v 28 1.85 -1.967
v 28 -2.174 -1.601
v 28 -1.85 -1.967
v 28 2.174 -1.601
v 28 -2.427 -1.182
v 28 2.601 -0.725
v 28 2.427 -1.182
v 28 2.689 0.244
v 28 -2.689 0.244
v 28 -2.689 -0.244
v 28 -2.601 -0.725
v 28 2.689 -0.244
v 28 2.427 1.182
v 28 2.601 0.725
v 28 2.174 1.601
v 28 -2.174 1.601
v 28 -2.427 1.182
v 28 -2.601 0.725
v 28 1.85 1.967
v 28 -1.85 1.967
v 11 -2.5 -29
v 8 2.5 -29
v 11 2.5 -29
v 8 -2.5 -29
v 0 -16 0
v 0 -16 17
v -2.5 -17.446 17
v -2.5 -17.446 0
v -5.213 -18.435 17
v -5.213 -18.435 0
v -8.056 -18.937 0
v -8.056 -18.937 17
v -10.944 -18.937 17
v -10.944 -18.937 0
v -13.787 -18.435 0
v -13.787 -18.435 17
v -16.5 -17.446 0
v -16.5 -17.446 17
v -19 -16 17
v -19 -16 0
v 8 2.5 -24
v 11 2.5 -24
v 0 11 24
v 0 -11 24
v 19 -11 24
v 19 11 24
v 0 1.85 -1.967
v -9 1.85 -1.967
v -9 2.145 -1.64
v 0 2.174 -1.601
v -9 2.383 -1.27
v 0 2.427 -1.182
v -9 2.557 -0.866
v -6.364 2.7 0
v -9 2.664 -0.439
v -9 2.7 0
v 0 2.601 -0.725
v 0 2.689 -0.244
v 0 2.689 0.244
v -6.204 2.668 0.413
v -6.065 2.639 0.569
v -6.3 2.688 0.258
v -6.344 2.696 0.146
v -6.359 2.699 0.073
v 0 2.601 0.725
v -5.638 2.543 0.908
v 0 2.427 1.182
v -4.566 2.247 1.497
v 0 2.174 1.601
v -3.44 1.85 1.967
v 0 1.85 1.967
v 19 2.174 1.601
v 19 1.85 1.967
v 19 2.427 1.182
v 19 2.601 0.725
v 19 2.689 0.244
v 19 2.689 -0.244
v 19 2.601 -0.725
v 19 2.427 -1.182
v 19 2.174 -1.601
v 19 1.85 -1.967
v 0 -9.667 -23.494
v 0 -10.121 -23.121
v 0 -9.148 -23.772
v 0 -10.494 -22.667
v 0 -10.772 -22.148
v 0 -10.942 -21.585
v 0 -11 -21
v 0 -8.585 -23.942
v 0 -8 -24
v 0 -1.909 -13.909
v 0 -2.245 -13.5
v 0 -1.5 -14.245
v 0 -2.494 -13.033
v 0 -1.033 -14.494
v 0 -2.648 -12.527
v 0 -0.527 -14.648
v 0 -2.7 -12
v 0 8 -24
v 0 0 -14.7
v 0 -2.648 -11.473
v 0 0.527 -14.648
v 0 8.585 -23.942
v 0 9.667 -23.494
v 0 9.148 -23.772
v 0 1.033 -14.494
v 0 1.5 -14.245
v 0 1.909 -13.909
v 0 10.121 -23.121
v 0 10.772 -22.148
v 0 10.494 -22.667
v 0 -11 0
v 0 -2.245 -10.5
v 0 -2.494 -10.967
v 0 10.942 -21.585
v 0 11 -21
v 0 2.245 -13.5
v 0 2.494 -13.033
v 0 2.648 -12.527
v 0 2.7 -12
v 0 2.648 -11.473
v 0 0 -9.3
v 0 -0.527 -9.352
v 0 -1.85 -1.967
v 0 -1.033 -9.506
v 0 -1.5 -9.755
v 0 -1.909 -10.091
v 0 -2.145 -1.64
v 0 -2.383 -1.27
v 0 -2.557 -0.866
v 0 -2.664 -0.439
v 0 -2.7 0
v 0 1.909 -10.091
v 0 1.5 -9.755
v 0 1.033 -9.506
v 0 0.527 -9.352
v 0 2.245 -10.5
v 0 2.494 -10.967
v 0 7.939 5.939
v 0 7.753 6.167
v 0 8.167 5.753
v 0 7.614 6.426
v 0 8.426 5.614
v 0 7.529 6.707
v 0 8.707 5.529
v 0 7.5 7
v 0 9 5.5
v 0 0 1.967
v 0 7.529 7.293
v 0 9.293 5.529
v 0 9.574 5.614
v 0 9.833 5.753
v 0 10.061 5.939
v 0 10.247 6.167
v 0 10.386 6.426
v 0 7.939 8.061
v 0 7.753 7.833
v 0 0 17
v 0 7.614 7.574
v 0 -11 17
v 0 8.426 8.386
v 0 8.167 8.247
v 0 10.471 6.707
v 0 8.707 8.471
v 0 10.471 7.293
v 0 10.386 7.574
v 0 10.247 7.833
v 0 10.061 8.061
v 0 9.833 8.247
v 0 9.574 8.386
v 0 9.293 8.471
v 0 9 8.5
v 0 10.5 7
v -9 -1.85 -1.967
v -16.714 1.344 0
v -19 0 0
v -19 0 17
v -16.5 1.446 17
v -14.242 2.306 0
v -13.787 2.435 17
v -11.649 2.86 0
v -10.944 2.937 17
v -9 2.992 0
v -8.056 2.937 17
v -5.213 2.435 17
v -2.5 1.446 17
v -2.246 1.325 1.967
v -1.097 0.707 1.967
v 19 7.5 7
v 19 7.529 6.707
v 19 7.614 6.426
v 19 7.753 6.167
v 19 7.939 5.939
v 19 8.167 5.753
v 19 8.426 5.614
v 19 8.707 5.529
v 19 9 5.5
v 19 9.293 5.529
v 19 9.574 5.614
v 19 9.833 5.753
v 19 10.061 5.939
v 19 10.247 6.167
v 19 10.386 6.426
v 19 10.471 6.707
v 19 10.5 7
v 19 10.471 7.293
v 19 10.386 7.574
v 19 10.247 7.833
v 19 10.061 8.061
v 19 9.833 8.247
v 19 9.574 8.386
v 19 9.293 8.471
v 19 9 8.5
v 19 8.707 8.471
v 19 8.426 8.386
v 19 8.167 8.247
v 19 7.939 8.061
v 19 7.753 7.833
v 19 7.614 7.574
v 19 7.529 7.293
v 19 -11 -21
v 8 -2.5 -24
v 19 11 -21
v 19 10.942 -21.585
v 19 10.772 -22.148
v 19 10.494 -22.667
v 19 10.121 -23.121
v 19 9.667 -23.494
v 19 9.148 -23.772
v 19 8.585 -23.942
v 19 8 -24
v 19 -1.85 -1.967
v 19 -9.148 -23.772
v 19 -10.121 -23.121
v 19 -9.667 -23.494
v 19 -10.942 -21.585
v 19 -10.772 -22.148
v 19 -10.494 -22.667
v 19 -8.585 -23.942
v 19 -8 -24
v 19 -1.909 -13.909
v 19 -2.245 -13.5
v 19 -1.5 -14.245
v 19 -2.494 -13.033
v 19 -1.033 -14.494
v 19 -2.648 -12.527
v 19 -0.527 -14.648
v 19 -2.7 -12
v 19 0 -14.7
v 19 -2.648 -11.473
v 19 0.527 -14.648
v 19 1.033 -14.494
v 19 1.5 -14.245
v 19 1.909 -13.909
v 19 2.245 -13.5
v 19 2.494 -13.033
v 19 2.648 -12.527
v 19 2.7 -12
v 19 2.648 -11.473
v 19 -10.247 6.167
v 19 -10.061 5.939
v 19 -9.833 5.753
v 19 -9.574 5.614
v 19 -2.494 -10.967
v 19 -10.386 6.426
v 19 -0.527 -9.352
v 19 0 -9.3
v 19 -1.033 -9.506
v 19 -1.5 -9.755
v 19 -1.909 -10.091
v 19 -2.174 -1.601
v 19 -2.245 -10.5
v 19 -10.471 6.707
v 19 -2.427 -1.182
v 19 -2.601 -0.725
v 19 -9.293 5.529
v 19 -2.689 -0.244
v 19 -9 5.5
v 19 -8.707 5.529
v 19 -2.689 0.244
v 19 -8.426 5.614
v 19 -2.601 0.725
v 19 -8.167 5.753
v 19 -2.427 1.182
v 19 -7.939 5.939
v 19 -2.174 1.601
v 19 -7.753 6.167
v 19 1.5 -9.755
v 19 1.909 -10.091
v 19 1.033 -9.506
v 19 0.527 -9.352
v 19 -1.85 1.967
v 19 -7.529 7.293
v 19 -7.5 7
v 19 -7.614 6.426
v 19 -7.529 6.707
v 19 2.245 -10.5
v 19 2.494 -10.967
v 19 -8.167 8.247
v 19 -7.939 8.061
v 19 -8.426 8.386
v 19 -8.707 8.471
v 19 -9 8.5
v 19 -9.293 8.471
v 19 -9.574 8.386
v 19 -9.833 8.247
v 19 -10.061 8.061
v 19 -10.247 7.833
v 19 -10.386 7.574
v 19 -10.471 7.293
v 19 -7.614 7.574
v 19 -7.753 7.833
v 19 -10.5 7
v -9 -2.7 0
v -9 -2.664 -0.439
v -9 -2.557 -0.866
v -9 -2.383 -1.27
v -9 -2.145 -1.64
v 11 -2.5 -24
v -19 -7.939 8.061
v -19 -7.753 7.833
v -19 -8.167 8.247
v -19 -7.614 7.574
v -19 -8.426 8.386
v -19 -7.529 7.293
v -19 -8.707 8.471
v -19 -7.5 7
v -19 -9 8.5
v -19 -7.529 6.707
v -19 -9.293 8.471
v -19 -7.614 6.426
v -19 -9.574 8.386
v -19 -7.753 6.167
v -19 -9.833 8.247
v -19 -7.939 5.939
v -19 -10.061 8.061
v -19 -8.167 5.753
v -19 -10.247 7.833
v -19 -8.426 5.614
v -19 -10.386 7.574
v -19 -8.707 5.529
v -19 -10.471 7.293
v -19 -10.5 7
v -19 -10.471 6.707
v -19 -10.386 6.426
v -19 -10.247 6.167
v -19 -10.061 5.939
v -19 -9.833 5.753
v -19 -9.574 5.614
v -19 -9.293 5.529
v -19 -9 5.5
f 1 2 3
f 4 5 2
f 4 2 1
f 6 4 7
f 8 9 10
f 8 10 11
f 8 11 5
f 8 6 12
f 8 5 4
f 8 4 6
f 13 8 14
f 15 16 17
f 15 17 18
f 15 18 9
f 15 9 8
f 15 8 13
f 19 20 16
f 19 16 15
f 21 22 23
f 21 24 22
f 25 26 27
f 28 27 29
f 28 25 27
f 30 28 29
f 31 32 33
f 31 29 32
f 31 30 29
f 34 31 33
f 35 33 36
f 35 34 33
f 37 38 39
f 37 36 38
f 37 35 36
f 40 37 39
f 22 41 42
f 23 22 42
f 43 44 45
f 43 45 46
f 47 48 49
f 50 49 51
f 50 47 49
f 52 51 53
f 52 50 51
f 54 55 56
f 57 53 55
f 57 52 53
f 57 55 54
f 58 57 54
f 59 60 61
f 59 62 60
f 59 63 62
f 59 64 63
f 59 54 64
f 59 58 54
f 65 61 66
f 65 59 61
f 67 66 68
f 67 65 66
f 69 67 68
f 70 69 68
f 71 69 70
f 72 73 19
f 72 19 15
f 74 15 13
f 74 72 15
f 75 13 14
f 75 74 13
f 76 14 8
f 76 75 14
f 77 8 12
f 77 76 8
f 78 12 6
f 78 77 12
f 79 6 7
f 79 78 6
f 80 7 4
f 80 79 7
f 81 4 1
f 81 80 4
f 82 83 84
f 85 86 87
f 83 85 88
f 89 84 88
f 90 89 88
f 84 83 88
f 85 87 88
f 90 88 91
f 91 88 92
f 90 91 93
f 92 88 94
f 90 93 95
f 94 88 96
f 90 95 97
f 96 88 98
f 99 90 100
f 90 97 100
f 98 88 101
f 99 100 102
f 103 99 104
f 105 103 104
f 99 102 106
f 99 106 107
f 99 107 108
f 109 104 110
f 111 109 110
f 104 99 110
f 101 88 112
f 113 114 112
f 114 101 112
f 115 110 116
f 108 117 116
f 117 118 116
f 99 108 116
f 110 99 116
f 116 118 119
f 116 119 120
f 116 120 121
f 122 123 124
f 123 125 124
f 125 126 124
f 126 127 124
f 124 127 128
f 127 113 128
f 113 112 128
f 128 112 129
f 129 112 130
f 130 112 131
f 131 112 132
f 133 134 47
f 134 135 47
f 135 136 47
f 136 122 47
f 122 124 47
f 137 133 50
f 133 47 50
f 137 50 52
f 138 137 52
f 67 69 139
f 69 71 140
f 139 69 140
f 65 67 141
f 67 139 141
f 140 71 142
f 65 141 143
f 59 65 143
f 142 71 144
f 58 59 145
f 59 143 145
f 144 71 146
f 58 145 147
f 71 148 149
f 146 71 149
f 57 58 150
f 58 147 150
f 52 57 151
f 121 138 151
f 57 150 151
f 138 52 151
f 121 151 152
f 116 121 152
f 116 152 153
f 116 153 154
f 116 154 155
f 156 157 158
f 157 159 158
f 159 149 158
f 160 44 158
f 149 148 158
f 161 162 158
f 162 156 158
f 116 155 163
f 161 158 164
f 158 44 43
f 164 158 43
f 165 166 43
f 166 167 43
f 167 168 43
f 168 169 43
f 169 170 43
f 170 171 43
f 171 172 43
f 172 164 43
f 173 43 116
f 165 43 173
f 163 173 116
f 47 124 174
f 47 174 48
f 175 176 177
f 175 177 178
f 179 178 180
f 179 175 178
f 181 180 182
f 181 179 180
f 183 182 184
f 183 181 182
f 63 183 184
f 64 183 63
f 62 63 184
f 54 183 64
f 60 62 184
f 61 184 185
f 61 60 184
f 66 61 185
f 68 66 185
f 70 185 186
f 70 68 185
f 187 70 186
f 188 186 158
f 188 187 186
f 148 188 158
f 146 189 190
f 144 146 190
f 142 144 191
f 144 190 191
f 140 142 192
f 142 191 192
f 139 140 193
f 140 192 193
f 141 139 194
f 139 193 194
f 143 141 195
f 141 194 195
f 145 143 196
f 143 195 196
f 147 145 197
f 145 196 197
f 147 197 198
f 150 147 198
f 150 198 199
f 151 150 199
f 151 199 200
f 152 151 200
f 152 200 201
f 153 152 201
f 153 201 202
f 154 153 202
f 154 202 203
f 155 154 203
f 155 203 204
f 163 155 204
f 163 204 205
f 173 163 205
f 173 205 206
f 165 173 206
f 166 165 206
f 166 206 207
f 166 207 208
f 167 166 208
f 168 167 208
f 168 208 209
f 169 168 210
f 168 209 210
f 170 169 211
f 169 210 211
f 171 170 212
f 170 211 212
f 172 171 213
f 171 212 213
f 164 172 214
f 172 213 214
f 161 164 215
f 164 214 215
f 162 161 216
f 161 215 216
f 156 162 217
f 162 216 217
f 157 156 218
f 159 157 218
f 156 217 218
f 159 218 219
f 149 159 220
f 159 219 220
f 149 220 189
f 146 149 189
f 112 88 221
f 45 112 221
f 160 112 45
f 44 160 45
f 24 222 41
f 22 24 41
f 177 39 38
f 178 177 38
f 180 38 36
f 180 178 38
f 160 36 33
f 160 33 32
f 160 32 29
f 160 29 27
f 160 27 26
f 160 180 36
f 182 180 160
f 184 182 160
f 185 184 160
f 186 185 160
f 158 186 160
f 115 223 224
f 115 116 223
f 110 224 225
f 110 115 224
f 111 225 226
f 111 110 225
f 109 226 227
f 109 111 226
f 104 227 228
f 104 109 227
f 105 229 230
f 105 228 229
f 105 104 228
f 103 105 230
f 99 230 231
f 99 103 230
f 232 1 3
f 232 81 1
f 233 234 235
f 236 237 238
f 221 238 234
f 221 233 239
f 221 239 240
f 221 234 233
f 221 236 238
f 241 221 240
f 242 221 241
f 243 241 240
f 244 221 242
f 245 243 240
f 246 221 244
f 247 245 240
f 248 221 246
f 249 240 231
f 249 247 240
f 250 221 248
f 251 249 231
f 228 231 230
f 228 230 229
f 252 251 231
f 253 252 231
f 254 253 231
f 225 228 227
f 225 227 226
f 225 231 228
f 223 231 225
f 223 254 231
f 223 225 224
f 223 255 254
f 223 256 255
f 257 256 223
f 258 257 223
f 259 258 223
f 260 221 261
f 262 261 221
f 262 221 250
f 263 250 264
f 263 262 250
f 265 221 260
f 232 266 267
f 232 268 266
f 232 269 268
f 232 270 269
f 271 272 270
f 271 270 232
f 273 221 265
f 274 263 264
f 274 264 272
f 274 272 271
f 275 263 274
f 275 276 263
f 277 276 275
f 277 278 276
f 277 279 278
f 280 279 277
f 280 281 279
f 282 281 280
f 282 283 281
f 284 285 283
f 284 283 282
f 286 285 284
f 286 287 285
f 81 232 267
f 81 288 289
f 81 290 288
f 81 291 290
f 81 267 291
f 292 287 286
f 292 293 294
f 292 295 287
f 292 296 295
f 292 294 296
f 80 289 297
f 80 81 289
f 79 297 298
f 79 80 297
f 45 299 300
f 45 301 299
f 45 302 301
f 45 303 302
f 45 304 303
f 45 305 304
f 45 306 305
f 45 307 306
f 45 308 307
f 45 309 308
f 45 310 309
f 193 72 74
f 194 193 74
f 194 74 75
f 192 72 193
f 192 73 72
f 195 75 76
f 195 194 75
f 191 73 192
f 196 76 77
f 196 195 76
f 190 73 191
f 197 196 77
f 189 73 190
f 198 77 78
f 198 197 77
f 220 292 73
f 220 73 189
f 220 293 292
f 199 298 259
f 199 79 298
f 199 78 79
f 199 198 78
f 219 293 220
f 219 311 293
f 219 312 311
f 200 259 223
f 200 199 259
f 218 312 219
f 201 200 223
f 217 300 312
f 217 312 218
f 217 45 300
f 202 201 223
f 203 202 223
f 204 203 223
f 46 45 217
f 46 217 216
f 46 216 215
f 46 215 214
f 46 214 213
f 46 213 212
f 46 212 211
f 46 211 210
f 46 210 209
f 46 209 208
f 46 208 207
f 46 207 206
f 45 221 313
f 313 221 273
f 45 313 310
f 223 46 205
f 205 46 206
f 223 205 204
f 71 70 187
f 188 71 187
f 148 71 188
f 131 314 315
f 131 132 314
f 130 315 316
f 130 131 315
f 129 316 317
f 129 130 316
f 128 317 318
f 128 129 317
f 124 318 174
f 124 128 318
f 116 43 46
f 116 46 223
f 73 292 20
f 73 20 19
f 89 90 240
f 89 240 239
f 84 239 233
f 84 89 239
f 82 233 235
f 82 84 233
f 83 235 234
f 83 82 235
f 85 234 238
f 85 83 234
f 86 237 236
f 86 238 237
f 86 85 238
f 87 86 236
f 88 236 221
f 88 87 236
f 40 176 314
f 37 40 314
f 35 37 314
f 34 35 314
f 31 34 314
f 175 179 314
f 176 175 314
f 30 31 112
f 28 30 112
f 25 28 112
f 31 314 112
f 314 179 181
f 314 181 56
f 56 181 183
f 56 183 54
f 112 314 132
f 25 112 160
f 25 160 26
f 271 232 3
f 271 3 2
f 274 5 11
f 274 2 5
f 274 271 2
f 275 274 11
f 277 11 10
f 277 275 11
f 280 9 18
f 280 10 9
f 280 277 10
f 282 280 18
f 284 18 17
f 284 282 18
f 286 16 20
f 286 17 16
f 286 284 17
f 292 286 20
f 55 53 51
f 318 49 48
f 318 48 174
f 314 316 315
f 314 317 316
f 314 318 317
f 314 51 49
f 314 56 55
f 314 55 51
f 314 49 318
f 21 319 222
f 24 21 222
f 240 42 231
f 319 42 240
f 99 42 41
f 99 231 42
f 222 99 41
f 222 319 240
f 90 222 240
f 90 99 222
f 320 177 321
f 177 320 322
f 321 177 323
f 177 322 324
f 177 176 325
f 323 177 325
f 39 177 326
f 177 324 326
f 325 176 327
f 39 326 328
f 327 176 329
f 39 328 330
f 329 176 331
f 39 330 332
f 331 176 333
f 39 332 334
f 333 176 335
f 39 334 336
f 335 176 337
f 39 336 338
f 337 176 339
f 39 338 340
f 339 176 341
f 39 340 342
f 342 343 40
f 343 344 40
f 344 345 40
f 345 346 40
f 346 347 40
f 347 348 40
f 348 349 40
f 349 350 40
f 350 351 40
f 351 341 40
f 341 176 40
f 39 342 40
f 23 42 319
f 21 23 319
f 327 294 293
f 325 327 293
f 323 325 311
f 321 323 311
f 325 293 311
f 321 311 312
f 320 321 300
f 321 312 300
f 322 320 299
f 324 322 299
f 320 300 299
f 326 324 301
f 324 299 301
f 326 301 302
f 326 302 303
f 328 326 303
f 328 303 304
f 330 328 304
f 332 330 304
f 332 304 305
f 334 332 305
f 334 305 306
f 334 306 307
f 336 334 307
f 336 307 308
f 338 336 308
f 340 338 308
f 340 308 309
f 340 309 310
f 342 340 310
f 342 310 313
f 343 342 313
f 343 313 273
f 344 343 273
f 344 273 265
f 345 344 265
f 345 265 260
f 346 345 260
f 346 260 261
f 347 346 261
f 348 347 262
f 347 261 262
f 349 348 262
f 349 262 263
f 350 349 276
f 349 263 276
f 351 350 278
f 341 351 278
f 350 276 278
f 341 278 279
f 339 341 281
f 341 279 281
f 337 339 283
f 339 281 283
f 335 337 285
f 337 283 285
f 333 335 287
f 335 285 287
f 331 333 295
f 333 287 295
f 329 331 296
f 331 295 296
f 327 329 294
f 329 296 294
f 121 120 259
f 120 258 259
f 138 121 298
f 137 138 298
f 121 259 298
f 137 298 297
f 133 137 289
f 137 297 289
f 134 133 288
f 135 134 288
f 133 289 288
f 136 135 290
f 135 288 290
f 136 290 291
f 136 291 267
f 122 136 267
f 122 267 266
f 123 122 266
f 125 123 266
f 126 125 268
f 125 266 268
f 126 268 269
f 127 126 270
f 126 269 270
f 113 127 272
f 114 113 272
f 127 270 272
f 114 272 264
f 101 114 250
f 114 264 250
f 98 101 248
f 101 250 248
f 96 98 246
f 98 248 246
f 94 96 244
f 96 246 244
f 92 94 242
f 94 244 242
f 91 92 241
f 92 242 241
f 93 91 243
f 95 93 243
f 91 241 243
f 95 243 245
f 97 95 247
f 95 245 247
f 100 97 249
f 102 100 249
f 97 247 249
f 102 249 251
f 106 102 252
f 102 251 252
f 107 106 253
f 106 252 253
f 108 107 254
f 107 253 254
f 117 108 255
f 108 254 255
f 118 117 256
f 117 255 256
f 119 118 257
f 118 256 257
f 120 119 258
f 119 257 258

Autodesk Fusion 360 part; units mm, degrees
sketch "Center" plane through (0, 0, 0) normal (1, 0, 0) x (0, 1, 0)
  circle A0 centre (0, 0) radius 2.7
  dimension "d1" = 5.4
extrude "Center width" add sketch "Center" along normal blind 19 makes body 1
sketch "Axis" plane through (19, 0, 0) normal (1, 0, 0) x (0, 1, 0)
  circle A0 centre (0, 0) radius 2.7
  line L0 (-1.85, 1.9666) -> (1.85, 1.9666)
  line L1 (1.85, -1.9666) -> (-1.85, -1.9666)
  arc A1 (-1.85, 1.9666) -> (-1.85, -1.9666) centre (0, 0) ccw
  arc A2 (1.85, -1.9666) -> (1.85, 1.9666) centre (0, 0) ccw
  dimension "d4" = 5.4
  dimension "d5" = 3.7
extrude "Axis width" add sketch "Axis" along normal blind 9 separate body contours A0 L0 L1 A1 A2 makes body 2
ref_plane "WorkPlane1" through (9.5, 0, 0) normal (1, 0, 0) x (0, 1, 0)
mirror "Axis mirror" about plane through (9.5, 0, 0) normal (1, 0, 0) of "Axis width" makes body 3
equation "d8 = ( 19 / 2 ) * 1 mm"

Autodesk Fusion 360 part; units mm, degrees
sketch "Motor base" plane through (0, 0, 0) normal (0, 0, 1) x (1, 0, 0)
  line L0 (0, 0) -> (0, -16)
  line L1 (0, -8) -> (-19, -8) construction
  line L2 (-9.5, -8) -> (-9.5, -19) construction
  line L3 (-19, 0) -> (-19, -16)
  arc A0 (-19, -16) -> (0, -16) centre (-9.5, -2.4583) ccw
  arc A1 (0, 0) -> (-19, 0) centre (-9.5, -13.5417) ccw
  dimension "d1" = 16
  dimension "d2" = 19
  dimension "d3" = 11
extrude "Motor height" add sketch "Motor base" along normal blind 17
equation "d1 = 22 mm - 6 mm"

Autodesk Fusion 360 part; units mm, degrees
sketch "Case base" plane through (0, 0, 0) normal (1, 0, 0) x (0, 1, 0)
  line L0 (-11, 24) -> (11, 24)
  line L1 (11, 24) -> (11, -21)
  line L2 (8, -24) -> (-8, -24)
  line L3 (-11, -21) -> (-11, 24)
  line L4 (-11, 24) -> (11, -24) construction
  line L5 (11, 24) -> (-11, -24) construction
  arc A0 (-11, -21) -> (-8, -24) centre (-8, -21) ccw
  arc A1 (8, -24) -> (11, -21) centre (8, -21) ccw
  dimension "d5" = 22
  dimension "d6" = 48
  dimension "d7" = 3
  dimension "d8" = 3
extrude "Case width" add sketch "Case base" along normal blind 19
sketch "Pin base" plane through (0, 0, -24) normal (0, 0, -1) x (1, 0, 0)
  line L0 (0, 8) -> (0, -8)
  line L1 (0, -8) -> (19, -8)
  line L2 (19, -8) -> (19, 8)
  line L3 (19, 8) -> (0, 8)
  line L4 (0, 0) -> (19, 0) construction
  line L5 (11, 2.5) -> (8, 2.5)
  line L6 (8, 2.5) -> (8, -2.5)
  line L7 (8, -2.5) -> (11, -2.5)
  line L8 (11, -2.5) -> (11, 2.5)
  line L9 (11, 2.5) -> (8, -2.5) construction
  line L10 (8, 2.5) -> (11, -2.5) construction
  point P0 (9.5, 0)
  dimension "d11" = 5
  dimension "d12" = 3
extrude "Pin base (1)" add sketch "Pin base" along normal blind 5 contours L5 L6 L7 L8
sketch "Pin hole" plane through (11, 0, 0) normal (1, 0, 0) x (0, 1, 0)
  line L0 (2.5, -24) -> (-2.5, -24)
  line L1 (-2.5, -24) -> (-2.5, -29)
  line L2 (-2.5, -29) -> (2.5, -29)
  line L3 (2.5, -29) -> (2.5, -24)
  circle A0 centre (0, -26.5) radius 1.5
  dimension "d15" = 3
extrude "Pin hole (1)" cut sketch "Pin hole" along normal through all contours A0
sketch "Case axis" plane through (19, 0, 0) normal (1, 0, 0) x (0, 1, 0)
  arc A0 (-11, -21) -> (-8, -24) centre (-8, -21) ccw
  line L0 (-8, -24) -> (8, -24)
  arc A1 (8, -24) -> (11, -21) centre (8, -21) ccw
  line L1 (11, -21) -> (11, 24)
  line L2 (11, 24) -> (-11, 24)
  line L3 (-11, 24) -> (-11, -21)
  line L4 (0, -24) -> (0, -12) construction
  circle A2 centre (0, -12) radius 2.7
  dimension "d17" = 12
  dimension "d18" = 5.4
extrude "Case axis (1)" cut sketch "Case axis" against normal through all contours A2
sketch "Case hole" plane through (19, 0, 0) normal (1, 0, 0) x (0, 1, 0)
  circle A0 centre (0, -12) radius 2.7
  arc A1 (-11, -21) -> (-8, -24) centre (-8, -21) ccw
  line L0 (-8, -24) -> (8, -24)
  arc A2 (8, -24) -> (11, -21) centre (8, -21) ccw
  line L1 (11, -21) -> (11, 24)
  line L2 (11, 24) -> (-11, 24)
  line L3 (-11, 24) -> (-11, -21)
  line L4 (-11, 22) -> (-9, 22) construction
  line L5 (-9, 24) -> (-9, 7) construction
  circle A3 centre (-9, 7) radius 1.5
  dimension "d20" = 2
  dimension "d21" = 17
  dimension "d22" = 3
extrude "Case hole (1)" cut sketch "Case hole" against normal through all contours A3
mirror "Case holes" about plane through (0, 0, 0) normal (0, 1, 0) of "Case hole (1)"
